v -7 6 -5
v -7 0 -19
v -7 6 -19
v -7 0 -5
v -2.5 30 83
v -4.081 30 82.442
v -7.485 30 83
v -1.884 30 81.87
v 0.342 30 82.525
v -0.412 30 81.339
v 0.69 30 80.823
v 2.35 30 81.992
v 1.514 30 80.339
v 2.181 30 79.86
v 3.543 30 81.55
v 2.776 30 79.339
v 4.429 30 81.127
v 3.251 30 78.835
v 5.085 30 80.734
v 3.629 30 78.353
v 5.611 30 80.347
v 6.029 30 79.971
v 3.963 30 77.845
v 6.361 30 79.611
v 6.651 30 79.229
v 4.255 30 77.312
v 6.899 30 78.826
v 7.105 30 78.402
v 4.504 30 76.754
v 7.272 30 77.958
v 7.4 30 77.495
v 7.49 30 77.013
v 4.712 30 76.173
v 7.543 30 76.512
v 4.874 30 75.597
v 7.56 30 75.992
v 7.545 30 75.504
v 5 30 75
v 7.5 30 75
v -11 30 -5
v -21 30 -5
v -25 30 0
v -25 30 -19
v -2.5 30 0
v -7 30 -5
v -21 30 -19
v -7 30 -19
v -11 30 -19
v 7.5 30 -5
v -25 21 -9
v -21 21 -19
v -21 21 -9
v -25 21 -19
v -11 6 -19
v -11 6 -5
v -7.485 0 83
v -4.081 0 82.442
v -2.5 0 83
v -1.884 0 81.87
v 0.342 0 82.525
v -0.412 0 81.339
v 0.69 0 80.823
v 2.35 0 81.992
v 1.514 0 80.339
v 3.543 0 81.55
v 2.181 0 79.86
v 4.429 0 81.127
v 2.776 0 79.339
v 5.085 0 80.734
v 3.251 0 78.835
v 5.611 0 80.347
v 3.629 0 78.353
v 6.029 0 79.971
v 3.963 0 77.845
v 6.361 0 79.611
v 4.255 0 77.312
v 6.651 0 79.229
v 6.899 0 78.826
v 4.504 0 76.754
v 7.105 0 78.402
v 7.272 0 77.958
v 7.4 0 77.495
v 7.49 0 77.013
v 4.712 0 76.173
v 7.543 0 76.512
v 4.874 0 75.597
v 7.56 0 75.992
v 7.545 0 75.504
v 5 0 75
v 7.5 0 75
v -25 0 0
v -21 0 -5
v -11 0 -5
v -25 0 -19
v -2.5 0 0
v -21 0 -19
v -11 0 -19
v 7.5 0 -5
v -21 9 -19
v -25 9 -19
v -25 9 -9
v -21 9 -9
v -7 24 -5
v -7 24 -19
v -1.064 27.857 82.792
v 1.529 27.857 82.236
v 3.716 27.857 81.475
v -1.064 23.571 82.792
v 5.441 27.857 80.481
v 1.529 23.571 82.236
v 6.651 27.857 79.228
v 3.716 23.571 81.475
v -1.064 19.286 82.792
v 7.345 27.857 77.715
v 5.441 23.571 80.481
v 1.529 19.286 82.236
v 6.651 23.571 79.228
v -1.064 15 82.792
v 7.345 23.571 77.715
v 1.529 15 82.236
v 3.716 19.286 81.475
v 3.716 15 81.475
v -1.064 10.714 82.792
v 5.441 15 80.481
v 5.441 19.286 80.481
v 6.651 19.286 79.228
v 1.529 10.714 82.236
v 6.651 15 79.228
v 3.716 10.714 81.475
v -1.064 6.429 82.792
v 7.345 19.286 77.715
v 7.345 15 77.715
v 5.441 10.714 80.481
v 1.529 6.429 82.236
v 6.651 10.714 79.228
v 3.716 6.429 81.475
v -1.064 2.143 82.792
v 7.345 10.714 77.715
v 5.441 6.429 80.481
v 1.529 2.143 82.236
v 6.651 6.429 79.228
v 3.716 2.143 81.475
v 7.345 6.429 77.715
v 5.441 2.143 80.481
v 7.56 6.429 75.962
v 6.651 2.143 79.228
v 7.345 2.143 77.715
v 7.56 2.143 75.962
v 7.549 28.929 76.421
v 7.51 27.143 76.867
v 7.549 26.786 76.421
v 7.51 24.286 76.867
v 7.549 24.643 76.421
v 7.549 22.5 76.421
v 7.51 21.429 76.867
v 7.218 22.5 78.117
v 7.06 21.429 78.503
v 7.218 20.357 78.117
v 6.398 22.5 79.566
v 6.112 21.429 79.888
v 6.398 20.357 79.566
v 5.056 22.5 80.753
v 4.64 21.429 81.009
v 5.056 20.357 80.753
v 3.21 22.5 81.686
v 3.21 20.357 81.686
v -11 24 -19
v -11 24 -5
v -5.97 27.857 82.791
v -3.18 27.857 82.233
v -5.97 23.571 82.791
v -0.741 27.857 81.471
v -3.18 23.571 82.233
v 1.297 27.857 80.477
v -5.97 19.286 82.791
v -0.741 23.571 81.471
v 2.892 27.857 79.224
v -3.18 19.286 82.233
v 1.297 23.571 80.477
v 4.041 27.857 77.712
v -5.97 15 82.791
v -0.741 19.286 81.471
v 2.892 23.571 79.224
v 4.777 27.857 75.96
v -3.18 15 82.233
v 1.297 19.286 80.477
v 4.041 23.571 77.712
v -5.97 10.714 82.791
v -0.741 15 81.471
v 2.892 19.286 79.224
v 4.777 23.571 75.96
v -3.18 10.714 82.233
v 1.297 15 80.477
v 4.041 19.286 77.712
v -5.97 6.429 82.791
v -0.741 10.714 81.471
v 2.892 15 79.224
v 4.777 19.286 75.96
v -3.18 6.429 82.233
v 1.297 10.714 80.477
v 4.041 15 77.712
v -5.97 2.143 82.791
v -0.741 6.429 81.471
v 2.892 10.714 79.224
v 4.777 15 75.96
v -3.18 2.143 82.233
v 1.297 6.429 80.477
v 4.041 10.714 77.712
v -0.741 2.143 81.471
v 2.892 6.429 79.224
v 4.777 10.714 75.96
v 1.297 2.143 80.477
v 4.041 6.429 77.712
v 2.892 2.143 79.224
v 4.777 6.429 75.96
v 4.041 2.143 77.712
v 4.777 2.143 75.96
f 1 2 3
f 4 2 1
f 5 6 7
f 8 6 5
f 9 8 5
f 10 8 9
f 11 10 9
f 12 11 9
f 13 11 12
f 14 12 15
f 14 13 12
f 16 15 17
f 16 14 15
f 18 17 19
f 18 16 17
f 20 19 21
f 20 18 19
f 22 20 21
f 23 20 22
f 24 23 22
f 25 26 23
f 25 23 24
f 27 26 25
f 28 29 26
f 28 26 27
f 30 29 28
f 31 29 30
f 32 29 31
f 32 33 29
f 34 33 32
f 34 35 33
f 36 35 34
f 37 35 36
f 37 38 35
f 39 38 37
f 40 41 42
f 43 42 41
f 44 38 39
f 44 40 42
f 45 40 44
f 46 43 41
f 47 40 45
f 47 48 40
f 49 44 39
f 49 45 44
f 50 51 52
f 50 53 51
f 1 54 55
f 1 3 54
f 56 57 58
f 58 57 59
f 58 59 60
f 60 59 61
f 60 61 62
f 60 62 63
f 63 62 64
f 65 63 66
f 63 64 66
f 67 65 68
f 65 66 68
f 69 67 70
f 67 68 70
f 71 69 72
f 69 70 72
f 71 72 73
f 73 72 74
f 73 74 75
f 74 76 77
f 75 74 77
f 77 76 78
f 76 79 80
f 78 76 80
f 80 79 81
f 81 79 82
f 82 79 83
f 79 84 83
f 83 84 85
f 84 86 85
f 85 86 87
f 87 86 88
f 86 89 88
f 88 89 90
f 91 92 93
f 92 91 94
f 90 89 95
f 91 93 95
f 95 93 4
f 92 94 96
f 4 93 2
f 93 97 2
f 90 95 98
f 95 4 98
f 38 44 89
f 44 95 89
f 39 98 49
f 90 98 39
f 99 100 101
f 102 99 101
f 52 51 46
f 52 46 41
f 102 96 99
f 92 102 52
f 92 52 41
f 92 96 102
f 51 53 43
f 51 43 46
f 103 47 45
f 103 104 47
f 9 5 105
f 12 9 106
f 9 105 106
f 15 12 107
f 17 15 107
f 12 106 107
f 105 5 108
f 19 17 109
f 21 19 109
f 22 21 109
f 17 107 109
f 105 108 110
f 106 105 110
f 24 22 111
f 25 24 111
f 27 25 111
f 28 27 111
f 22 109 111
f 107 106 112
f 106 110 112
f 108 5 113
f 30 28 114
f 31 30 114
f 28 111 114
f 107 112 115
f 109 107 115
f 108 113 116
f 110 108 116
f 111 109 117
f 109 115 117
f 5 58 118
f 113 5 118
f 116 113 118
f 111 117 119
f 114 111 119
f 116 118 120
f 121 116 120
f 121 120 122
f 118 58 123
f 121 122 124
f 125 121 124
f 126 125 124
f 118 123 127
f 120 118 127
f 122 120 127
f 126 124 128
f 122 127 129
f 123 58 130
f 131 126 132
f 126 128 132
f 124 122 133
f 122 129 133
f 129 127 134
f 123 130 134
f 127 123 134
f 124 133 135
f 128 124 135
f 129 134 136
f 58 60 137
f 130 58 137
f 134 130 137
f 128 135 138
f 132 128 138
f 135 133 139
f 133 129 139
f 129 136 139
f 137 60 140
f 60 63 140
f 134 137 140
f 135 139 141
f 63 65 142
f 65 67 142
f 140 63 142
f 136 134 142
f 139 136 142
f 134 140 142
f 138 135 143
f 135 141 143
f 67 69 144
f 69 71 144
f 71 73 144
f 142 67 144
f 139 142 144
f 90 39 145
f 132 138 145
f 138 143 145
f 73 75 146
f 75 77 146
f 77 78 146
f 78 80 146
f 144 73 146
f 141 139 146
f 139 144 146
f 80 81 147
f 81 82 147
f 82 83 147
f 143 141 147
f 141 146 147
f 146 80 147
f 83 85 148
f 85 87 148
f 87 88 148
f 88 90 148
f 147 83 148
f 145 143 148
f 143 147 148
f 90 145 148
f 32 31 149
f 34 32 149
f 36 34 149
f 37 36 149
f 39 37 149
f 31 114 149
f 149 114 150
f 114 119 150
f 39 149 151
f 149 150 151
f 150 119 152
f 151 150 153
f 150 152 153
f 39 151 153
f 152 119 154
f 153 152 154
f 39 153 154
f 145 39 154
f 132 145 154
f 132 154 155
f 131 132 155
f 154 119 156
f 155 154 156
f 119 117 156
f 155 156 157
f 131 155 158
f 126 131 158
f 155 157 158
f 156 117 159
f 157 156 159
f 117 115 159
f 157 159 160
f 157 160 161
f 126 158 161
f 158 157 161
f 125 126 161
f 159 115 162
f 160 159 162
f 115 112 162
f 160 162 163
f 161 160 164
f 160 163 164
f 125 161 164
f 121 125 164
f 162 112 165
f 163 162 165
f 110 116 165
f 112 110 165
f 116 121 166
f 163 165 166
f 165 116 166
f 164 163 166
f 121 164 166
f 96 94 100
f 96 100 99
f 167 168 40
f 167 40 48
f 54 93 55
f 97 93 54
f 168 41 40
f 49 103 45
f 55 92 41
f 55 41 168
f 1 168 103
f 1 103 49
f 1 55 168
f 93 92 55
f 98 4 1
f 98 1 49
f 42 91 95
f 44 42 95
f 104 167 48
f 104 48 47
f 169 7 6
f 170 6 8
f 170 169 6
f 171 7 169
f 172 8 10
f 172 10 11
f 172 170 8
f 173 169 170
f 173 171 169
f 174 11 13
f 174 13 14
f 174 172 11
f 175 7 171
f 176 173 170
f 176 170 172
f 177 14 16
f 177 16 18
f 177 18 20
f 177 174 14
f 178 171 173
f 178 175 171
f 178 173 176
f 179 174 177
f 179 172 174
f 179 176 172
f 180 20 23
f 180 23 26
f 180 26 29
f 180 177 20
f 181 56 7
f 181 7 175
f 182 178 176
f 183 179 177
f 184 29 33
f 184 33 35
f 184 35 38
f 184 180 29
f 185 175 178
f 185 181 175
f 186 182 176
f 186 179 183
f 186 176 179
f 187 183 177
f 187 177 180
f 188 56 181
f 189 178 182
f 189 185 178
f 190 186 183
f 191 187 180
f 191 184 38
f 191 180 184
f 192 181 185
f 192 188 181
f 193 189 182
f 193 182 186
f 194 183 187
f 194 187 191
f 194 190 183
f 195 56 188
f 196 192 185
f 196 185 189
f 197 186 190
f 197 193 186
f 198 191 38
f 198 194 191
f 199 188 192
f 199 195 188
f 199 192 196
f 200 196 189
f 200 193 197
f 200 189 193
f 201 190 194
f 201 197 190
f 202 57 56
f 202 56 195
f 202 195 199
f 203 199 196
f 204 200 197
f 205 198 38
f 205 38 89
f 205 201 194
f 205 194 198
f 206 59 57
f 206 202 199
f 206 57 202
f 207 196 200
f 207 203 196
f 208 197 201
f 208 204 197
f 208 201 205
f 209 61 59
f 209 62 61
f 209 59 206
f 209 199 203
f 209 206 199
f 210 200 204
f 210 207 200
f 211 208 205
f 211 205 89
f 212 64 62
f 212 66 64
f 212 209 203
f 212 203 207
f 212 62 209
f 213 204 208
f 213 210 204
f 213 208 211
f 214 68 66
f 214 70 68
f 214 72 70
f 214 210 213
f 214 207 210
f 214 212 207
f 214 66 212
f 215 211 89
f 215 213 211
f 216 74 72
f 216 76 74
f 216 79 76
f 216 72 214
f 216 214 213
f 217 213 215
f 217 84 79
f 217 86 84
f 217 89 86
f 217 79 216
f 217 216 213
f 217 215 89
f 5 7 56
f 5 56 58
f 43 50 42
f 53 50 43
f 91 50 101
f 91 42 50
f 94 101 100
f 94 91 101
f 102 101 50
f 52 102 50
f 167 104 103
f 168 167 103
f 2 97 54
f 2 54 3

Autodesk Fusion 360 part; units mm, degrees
sketch "Sketch1" plane through (0, 0, 0) normal (0, 1, 0) x (1, 0, 0)
  line L0 (-25, 0) -> (-25, 5)
  line L1 (-25, 5) -> (-25, 19)
  line L2 (-25, 19) -> (-21, 19)
  line L3 (-21, 19) -> (-21, 5)
  line L4 (-21, 5) -> (-11, 5)
  line L5 (-11, 5) -> (-11, 19)
  line L6 (-11, 19) -> (-7, 19)
  line L7 (-7, 19) -> (-7, 5)
  line L8 (-7, 5) -> (-2.5, 5)
  line L9 (-2.5, 5) -> (7.5, 5)
  line L10 (7.5, 5) -> (7.5, 0)
  line L11 (-25, 0) -> (-2.5, 0)
  line L12 (7.5, 0) -> (7.5, -5)
  line L13 (-7.4852, -82.9997) -> (-2.5, -83)
  spline S0 degree 5 poles (-7.4852, -82.9997) (-7.0499, -82.9476) (-6.1946, -82.8346) (-4.9577, -82.6382) (-3.4023, -82.3219) (-1.6257, -81.829) (-0.0341, -81.2286) (1.3528, -80.509) (2.5178, -79.6605) (3.4572, -78.6808) (4.1826, -77.5767) (4.6031, -76.6004) (4.8339, -75.819) (4.9508, -75.2766) (5, -75) knots 0 0 0 0 0 0 0.1 0.2 0.3 0.4 0.5 0.6 0.7 0.8 0.9 1 1 1 1 1 1
  line L14 (-2.5, 0) -> (5, -75)
  line L15 (5, -75) -> (7.5, -75)
  line L16 (7.5, -5) -> (7.5, -75)
  spline S1 degree 5 poles (-2.5, -83) (-2.0851, -82.9482) (-1.2732, -82.8357) (-0.1087, -82.64) (1.3356, -82.3244) (2.947, -81.8324) (4.3443, -81.2324) (5.5048, -80.5132) (6.4084, -79.6647) (7.0507, -78.6846) (7.4451, -77.5796) (7.5755, -76.6023) (7.5752, -75.8201) (7.5322, -75.277) (7.5, -75) knots 0 0 0 0 0 0 0.1 0.2 0.3 0.4 0.5 0.6 0.7 0.8 0.9 1 1 1 1 1 1
  point P0 (2, -80)
  point P1 (6, -80)
extrude "Extrude1" add sketch "Sketch1" along normal blind 30
sketch "Sketch2" plane through (-25, 0, 0) normal (-1, 0, 0) x (0, 0, 1)
  line L0 (-19, 0) -> (0, 0)
  line L1 (0, 0) -> (0, 30)
  line L2 (0, 30) -> (-19, 30)
  line L3 (-19, 30) -> (-19, 0)
  line L4 (0, 30) -> (-9, 30)
  line L5 (-9, 0) -> (0, 0)
  line L6 (0, 0) -> (0, 30)
  line L7 (-9, 30) -> (-19, 30)
  line L8 (-19, 30) -> (-19, 21)
  line L9 (-19, 21) -> (-9, 21)
  line L10 (-9, 0) -> (-19, 0)
  line L11 (-19, 0) -> (-19, 9)
  line L12 (-19, 9) -> (-9, 9)
  line L13 (-9, 21) -> (-19, 21)
  line L14 (-19, 21) -> (-19, 9)
  line L15 (-19, 9) -> (-9, 9)
  line L16 (-9, 9) -> (-9, 21)
extrude "Extrude2" cut sketch "Sketch2" against normal blind 4 contours L3 L9 L12 L13 L14 L15 L16
sketch "Sketch3" plane through (-7, 0, 0) normal (1, 0, 0) x (0, 0, -1)
  line L0 (5, 0) -> (19, 0)
  line L1 (19, 0) -> (19, 30)
  line L2 (19, 30) -> (5, 30)
  line L3 (5, 30) -> (5, 0)
  line L4 (5, 0) -> (19, 0)
  line L5 (19, 0) -> (19, 6)
  line L6 (19, 6) -> (5, 6)
  line L7 (5, 6) -> (5, 0)
  line L8 (5, 30) -> (19, 30)
  line L9 (19, 30) -> (19, 24)
  line L10 (19, 24) -> (5, 24)
  line L11 (5, 24) -> (5, 30)
  dimension "d29" = 6
  dimension "d30" = 6
extrude "Extrude3" cut sketch "Sketch3" against normal blind 4 contours L1 L3 L6 L10
